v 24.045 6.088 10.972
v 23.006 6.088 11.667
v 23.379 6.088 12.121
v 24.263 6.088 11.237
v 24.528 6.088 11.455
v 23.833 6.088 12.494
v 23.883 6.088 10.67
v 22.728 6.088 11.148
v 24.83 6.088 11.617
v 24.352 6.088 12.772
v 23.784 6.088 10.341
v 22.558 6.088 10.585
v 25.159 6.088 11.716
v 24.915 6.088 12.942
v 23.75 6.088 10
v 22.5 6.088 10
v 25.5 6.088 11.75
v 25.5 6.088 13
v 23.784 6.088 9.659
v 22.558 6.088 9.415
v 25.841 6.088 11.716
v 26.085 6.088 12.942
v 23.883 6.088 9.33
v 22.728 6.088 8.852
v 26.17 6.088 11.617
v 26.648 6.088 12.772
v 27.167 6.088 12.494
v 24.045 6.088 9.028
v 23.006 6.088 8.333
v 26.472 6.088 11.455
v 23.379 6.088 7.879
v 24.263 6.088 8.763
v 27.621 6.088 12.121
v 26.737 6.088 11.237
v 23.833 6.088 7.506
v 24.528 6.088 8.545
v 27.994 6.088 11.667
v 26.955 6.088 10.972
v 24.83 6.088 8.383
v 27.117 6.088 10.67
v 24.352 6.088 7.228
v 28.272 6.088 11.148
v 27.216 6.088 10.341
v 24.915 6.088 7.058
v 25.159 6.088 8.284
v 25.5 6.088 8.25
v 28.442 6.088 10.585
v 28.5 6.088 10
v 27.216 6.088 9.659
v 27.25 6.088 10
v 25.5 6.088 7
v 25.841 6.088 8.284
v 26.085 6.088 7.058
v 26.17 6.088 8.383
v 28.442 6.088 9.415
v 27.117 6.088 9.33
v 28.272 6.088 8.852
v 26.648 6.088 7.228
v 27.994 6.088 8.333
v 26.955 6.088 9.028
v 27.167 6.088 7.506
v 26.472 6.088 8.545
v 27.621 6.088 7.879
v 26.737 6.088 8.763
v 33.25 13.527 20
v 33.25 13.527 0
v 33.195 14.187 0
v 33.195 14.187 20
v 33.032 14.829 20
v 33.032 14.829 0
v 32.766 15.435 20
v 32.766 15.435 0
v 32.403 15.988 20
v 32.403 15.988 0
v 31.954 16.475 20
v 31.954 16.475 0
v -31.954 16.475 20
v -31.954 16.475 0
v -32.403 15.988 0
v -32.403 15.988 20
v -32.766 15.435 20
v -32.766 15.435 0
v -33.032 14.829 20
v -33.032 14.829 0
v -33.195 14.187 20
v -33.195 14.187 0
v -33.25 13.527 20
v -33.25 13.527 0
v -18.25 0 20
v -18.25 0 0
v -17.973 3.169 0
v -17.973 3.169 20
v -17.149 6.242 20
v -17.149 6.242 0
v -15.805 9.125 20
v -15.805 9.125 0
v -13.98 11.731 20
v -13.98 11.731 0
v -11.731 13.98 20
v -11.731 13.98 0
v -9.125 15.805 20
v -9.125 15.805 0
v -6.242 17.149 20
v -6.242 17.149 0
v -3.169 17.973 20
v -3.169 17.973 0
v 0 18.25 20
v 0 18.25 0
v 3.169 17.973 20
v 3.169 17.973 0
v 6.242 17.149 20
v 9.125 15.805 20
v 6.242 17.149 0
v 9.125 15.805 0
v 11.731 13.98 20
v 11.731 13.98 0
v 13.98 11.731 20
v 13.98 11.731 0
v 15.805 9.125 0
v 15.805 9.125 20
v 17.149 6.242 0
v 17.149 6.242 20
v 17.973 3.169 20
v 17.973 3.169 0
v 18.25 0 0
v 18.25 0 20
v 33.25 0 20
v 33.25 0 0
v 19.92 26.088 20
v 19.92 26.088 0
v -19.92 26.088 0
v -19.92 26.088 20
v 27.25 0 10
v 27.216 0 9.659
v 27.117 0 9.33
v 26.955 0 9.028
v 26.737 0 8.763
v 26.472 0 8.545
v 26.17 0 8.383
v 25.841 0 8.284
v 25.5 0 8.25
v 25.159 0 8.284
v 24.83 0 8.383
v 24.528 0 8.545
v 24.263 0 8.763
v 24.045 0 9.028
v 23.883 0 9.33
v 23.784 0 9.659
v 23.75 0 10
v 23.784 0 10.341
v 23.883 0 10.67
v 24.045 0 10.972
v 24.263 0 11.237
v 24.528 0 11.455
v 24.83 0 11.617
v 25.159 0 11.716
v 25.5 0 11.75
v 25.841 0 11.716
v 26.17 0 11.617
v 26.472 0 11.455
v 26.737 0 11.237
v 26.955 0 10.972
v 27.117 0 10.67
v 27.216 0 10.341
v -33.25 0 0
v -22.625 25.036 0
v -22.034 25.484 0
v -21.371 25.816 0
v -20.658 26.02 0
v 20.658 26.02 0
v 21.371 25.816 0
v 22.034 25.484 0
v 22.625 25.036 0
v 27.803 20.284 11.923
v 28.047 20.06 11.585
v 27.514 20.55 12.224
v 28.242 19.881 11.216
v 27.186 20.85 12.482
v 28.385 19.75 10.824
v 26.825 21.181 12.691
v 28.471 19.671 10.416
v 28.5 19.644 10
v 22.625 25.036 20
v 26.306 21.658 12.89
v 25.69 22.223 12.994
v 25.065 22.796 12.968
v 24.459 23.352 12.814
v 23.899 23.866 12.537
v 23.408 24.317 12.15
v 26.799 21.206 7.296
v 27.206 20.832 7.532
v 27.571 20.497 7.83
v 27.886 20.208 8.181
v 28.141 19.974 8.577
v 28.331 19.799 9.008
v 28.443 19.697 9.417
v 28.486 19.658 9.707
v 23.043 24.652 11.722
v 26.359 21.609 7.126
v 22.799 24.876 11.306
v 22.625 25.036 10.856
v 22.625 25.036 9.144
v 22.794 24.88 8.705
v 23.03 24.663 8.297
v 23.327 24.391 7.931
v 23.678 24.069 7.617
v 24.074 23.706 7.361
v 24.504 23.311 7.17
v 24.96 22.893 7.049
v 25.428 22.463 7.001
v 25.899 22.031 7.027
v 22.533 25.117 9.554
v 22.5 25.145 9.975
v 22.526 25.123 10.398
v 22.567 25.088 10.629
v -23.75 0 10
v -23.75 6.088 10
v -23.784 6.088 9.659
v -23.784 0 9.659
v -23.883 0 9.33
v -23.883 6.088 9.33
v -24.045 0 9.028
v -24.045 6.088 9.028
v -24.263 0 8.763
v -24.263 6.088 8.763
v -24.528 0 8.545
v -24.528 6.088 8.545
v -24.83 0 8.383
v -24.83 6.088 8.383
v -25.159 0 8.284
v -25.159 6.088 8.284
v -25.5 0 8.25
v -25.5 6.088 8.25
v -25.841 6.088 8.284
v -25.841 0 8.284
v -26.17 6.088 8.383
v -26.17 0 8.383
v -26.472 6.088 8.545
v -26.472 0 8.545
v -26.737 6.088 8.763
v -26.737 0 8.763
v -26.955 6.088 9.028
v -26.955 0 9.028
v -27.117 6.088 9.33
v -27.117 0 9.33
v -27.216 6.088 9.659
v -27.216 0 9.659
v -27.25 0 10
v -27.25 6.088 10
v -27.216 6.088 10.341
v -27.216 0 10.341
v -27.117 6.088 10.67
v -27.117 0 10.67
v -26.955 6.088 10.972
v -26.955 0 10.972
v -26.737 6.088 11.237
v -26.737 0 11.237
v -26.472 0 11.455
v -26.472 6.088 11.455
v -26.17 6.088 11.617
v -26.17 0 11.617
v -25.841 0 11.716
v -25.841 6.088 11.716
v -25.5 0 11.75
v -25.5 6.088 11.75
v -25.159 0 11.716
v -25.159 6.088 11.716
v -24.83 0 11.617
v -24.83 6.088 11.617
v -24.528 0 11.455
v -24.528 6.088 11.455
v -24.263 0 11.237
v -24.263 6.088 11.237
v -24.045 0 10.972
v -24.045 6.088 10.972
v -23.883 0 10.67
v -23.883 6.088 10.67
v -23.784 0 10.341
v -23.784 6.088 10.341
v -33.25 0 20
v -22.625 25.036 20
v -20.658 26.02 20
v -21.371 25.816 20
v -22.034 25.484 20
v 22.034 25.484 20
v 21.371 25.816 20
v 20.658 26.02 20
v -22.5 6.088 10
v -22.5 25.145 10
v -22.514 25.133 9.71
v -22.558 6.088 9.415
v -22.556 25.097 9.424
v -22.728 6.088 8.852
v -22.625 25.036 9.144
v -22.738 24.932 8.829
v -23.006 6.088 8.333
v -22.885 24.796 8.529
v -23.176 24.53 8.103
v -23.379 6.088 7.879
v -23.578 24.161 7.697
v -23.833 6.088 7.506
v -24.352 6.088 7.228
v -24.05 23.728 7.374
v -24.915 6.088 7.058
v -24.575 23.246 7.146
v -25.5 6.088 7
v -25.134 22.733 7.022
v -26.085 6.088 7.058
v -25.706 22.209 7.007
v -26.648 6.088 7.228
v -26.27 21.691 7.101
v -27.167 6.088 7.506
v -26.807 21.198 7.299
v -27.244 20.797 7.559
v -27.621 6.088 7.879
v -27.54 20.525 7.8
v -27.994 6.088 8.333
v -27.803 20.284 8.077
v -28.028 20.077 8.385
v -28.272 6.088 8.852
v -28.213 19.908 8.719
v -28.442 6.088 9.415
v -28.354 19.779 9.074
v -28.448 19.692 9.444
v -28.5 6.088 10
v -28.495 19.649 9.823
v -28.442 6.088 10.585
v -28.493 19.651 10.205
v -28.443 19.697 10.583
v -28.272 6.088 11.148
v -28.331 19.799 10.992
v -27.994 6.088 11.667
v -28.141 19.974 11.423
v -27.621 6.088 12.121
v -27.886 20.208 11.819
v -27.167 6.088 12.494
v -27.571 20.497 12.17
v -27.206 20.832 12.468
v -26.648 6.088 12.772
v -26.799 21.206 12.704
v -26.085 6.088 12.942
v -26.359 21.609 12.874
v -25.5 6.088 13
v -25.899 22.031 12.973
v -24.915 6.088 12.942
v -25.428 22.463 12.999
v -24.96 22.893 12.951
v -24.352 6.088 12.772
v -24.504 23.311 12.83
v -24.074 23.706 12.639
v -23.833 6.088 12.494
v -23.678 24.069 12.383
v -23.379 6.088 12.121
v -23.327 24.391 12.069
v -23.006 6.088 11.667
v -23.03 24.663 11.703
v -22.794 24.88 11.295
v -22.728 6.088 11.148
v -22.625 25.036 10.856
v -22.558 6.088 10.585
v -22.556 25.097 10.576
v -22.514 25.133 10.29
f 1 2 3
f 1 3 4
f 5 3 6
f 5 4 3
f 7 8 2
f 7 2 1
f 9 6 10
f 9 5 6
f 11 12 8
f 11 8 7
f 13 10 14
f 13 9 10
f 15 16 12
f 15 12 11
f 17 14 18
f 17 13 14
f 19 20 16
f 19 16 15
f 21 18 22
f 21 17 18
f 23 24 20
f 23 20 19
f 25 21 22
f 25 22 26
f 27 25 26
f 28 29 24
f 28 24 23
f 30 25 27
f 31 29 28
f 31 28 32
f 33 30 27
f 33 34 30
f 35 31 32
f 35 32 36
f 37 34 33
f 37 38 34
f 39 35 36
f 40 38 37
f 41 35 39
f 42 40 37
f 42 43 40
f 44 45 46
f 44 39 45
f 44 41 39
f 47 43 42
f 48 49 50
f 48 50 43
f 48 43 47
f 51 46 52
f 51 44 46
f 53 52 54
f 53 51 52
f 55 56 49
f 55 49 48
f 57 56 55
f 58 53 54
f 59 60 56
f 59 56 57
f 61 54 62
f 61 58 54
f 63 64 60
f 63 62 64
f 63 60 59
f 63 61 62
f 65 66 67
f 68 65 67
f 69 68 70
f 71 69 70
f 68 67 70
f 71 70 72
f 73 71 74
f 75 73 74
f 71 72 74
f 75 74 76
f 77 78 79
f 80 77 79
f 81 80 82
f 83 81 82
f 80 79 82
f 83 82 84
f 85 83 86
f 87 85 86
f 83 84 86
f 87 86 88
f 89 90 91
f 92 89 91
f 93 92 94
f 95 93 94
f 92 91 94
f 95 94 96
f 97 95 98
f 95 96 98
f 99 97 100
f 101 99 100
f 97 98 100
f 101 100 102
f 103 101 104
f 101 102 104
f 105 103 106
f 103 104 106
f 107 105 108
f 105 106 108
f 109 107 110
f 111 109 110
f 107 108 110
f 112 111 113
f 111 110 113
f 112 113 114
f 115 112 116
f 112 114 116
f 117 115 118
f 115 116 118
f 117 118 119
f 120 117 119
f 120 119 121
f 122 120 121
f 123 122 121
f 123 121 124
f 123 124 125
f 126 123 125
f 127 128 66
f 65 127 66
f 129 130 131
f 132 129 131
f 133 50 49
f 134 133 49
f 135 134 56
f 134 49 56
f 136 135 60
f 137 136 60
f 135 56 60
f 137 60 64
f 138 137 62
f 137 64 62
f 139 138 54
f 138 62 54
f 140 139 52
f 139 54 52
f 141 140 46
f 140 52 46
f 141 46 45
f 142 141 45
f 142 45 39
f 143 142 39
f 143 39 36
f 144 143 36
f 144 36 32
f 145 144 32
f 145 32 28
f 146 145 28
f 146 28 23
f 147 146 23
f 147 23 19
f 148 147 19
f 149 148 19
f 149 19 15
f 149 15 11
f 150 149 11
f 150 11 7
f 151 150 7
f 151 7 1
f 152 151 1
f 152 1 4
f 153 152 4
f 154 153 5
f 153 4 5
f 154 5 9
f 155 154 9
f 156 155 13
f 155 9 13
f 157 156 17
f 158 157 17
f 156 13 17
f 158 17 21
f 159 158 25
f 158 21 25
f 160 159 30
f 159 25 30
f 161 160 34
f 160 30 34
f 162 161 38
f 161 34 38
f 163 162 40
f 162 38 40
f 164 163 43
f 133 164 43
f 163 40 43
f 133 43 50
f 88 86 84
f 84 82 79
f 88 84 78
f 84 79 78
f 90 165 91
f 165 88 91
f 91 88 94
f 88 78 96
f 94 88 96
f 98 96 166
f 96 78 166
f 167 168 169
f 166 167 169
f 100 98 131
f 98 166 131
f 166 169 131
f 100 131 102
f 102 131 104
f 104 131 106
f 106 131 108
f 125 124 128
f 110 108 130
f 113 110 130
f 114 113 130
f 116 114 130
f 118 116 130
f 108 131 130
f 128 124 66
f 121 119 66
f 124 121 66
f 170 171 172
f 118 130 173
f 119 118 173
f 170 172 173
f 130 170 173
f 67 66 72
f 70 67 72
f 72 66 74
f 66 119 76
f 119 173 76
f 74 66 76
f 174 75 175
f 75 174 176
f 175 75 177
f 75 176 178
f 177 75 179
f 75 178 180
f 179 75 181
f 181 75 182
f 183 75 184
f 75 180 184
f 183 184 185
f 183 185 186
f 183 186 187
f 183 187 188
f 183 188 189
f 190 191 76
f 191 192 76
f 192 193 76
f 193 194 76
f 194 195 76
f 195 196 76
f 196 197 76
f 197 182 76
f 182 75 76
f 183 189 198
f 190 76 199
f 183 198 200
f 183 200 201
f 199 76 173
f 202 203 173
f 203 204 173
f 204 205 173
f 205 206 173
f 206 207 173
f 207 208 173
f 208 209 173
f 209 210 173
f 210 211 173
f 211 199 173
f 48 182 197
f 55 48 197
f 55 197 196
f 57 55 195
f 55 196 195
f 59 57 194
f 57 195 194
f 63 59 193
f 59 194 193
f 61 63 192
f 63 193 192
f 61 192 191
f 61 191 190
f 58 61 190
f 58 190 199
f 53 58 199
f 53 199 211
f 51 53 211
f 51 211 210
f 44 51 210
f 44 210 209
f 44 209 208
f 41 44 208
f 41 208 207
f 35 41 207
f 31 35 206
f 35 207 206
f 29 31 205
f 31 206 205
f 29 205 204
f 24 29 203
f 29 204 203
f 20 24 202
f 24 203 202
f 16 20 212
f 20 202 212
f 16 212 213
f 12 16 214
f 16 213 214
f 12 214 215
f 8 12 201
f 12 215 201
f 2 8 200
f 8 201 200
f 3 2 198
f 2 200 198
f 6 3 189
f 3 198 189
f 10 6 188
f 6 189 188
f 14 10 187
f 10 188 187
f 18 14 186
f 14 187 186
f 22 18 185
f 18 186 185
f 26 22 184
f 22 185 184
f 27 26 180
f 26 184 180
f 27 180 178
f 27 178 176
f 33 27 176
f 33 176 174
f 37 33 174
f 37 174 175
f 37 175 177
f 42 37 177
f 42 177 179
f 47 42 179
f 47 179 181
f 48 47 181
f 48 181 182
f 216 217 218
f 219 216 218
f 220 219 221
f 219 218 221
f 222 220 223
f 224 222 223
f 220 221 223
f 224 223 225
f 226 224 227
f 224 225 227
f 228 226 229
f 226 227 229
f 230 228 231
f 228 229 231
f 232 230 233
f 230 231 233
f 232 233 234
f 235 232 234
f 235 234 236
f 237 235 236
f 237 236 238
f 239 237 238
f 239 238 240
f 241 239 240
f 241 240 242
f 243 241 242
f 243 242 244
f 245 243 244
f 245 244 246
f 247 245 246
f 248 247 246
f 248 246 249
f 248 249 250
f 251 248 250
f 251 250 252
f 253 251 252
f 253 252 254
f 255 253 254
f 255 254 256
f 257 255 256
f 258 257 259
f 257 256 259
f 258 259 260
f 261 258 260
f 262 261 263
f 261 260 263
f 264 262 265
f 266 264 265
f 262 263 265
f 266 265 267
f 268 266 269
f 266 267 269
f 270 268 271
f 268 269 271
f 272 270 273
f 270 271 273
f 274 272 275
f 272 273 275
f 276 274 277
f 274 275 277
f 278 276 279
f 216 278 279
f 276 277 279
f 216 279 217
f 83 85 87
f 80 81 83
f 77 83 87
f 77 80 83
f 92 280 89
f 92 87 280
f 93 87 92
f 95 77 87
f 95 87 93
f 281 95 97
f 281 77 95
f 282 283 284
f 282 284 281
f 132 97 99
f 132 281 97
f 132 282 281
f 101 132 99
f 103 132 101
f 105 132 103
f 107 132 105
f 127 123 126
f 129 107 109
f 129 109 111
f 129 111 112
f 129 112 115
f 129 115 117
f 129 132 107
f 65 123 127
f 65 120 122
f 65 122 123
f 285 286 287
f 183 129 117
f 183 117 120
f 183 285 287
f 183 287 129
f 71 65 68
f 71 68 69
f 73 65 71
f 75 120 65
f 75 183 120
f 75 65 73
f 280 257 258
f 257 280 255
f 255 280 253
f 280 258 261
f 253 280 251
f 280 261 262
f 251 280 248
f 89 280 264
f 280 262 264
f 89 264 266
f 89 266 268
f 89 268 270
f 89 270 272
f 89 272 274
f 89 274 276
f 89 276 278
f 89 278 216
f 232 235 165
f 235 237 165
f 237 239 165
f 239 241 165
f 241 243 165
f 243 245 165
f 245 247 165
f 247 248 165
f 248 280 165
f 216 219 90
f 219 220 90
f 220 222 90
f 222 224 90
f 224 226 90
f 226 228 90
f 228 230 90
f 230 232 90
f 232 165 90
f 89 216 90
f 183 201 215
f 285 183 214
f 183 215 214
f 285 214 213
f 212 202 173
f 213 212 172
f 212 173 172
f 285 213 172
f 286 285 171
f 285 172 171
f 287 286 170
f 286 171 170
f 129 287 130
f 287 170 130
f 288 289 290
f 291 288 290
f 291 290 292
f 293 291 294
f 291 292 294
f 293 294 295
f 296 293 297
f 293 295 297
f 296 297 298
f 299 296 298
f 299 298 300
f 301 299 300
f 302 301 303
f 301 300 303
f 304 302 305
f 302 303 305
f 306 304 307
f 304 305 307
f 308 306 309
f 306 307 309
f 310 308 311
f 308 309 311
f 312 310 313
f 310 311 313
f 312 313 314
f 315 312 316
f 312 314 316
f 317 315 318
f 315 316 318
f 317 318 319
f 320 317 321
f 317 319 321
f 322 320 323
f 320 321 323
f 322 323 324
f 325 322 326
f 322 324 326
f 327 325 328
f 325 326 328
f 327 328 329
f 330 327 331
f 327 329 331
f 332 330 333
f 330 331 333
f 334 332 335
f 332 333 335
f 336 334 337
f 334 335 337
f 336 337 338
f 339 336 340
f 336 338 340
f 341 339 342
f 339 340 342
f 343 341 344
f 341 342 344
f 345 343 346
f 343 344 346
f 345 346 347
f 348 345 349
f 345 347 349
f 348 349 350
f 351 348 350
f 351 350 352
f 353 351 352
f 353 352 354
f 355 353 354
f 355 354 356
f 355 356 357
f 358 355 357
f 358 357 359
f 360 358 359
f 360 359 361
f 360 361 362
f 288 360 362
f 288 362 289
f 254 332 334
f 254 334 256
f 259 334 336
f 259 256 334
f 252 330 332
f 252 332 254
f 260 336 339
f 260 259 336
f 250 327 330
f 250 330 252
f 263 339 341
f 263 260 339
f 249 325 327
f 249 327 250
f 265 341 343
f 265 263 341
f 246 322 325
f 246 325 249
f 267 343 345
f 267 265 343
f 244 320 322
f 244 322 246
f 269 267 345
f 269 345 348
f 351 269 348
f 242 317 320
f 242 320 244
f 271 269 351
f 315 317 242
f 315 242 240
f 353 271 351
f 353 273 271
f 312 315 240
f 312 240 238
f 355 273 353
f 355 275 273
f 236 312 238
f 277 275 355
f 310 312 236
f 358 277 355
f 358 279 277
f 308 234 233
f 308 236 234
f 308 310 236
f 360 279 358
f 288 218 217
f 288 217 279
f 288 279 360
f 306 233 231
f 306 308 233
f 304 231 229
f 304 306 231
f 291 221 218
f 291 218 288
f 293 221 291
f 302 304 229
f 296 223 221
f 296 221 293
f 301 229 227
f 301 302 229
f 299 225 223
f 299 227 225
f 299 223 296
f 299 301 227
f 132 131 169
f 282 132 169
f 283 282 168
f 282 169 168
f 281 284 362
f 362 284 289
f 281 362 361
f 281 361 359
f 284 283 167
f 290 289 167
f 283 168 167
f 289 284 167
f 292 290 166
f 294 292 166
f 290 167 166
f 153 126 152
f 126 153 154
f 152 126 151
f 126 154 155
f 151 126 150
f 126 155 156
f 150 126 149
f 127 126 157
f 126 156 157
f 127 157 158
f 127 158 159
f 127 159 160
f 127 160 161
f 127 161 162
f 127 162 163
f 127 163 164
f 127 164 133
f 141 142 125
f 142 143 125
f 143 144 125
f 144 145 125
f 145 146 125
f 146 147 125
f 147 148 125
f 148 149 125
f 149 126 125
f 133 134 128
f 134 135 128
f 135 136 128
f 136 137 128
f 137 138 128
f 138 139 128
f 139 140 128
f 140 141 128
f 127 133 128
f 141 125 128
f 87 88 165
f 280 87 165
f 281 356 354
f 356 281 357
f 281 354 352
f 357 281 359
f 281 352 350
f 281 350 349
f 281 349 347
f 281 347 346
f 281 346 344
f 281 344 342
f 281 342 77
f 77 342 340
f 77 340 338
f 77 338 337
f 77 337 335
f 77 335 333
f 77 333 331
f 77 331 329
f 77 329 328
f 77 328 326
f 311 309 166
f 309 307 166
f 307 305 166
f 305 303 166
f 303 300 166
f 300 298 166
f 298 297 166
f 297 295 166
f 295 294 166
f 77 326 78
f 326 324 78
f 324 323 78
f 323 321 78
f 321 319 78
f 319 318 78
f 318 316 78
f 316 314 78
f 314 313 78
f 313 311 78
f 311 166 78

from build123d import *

# Parameters (mm, degrees)
EXTRUDE_1_DEPTH     = 20
SKETCH_2_R          = 3
CUT_EXTRUDE_1_DEPTH = 20
SKETCH_3_R          = 1.75
CUT_EXTRUDE_2_DEPTH = 27.088377855


with BuildPart() as part:
    # 草图1 → 凸台-拉伸1 (new body)
    with BuildSketch(Plane.XY):
        with BuildLine():
            Line((-33.25, 0), (-18.25, 0))
            ThreePointArc((-18.25, 0), (0, 18.25), (18.25, 0))
            Line((18.25, 0), (33.25, 0))
            Line((33.25, 0), (33.25, 13.52748426))
            ThreePointArc((33.25, 13.52748426), (32.911797538, 15.137216782), (31.954380604, 16.474741552))
            Line((31.954380604, 16.474741552), (22.624644973, 25.035635147))
            ThreePointArc((22.624644973, 25.035635147), (21.371293457, 25.815912507), (19.920264369, 26.088377855))
            Line((19.920264369, 26.088377855), (-19.920264369, 26.088377855))
            ThreePointArc((-19.920264369, 26.088377855), (-21.371293457, 25.815912507), (-22.624644973, 25.035635147))
            Line((-22.624644973, 25.035635147), (-31.954380604, 16.474741552))
            ThreePointArc((-31.954380604, 16.474741552), (-32.911797538, 15.137216782), (-33.25, 13.52748426))
            Line((-33.25, 13.52748426), (-33.25, 0))
        make_face()
    extrude(amount=EXTRUDE_1_DEPTH)

    # 草图2 → 切除-拉伸1 (cut)
    with BuildSketch(Plane(origin=(0, 26.088377855, 0), x_dir=(1, 0, 0), z_dir=(0, 1, 0))):
        with Locations((-25.5, -10)):
            Circle(SKETCH_2_R)
        with Locations((25.5, -10)):
            Circle(SKETCH_2_R)
    extrude(amount=-CUT_EXTRUDE_1_DEPTH, mode=Mode.SUBTRACT)

    # 草图3 → 切除-拉伸2 (cut, through all)
    with BuildSketch(Plane(origin=(0, 26.088377855, 0), x_dir=(1, 0, 0), z_dir=(0, 1, 0))):
        with Locations((25.5, -10)):
            Circle(SKETCH_3_R)
        with Locations((-25.5, -10)):
            Circle(SKETCH_3_R)
    extrude(amount=-CUT_EXTRUDE_2_DEPTH, mode=Mode.SUBTRACT)


solid = part.part
